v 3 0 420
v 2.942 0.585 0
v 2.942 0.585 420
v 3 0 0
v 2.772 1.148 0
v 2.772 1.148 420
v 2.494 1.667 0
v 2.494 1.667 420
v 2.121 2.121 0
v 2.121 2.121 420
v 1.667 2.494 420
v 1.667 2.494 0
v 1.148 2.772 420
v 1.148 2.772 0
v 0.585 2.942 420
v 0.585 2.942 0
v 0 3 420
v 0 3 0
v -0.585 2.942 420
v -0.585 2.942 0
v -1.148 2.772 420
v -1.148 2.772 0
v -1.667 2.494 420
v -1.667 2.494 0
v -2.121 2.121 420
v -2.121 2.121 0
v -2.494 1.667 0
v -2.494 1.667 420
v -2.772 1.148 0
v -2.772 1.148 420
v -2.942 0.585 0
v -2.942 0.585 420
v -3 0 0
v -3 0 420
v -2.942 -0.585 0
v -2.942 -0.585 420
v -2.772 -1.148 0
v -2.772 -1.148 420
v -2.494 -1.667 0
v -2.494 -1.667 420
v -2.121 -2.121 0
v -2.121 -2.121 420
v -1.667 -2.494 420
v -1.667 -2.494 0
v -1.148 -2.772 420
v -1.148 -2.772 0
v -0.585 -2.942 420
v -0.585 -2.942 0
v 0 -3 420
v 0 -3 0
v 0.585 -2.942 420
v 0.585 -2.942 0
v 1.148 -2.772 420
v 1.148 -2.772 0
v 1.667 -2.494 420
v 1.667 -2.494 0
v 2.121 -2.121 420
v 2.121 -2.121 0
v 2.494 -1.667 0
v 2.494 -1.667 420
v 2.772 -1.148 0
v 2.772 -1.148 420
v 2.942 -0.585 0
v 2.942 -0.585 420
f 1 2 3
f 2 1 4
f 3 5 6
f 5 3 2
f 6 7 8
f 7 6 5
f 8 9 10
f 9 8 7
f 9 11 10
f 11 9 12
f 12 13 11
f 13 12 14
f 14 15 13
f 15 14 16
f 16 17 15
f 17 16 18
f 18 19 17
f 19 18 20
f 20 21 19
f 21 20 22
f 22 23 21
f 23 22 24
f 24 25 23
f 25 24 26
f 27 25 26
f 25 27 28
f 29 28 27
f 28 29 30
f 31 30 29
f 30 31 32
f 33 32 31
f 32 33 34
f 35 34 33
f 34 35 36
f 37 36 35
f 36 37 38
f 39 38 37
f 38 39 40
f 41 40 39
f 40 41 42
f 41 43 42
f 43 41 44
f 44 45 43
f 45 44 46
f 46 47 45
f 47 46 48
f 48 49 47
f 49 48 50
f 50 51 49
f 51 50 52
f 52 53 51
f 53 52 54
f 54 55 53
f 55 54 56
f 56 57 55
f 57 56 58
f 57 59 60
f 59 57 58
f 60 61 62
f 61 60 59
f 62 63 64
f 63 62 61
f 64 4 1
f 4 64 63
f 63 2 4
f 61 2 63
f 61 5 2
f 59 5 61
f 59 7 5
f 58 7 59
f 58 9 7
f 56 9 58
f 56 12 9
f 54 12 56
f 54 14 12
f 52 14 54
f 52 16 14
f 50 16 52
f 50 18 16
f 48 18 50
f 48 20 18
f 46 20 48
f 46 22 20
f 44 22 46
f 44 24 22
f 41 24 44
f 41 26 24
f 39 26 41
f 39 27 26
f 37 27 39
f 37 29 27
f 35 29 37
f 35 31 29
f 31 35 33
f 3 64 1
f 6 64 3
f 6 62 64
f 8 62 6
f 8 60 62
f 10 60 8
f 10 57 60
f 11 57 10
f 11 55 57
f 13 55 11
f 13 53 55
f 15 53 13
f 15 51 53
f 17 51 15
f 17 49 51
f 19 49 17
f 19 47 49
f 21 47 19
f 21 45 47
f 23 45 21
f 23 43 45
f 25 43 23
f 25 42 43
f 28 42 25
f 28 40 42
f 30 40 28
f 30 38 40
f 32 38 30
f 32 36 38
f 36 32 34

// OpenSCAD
// Purchased hardware envelope; no modeled threads, not print.
$fn=32;
cylinder(d=6,h=420);
